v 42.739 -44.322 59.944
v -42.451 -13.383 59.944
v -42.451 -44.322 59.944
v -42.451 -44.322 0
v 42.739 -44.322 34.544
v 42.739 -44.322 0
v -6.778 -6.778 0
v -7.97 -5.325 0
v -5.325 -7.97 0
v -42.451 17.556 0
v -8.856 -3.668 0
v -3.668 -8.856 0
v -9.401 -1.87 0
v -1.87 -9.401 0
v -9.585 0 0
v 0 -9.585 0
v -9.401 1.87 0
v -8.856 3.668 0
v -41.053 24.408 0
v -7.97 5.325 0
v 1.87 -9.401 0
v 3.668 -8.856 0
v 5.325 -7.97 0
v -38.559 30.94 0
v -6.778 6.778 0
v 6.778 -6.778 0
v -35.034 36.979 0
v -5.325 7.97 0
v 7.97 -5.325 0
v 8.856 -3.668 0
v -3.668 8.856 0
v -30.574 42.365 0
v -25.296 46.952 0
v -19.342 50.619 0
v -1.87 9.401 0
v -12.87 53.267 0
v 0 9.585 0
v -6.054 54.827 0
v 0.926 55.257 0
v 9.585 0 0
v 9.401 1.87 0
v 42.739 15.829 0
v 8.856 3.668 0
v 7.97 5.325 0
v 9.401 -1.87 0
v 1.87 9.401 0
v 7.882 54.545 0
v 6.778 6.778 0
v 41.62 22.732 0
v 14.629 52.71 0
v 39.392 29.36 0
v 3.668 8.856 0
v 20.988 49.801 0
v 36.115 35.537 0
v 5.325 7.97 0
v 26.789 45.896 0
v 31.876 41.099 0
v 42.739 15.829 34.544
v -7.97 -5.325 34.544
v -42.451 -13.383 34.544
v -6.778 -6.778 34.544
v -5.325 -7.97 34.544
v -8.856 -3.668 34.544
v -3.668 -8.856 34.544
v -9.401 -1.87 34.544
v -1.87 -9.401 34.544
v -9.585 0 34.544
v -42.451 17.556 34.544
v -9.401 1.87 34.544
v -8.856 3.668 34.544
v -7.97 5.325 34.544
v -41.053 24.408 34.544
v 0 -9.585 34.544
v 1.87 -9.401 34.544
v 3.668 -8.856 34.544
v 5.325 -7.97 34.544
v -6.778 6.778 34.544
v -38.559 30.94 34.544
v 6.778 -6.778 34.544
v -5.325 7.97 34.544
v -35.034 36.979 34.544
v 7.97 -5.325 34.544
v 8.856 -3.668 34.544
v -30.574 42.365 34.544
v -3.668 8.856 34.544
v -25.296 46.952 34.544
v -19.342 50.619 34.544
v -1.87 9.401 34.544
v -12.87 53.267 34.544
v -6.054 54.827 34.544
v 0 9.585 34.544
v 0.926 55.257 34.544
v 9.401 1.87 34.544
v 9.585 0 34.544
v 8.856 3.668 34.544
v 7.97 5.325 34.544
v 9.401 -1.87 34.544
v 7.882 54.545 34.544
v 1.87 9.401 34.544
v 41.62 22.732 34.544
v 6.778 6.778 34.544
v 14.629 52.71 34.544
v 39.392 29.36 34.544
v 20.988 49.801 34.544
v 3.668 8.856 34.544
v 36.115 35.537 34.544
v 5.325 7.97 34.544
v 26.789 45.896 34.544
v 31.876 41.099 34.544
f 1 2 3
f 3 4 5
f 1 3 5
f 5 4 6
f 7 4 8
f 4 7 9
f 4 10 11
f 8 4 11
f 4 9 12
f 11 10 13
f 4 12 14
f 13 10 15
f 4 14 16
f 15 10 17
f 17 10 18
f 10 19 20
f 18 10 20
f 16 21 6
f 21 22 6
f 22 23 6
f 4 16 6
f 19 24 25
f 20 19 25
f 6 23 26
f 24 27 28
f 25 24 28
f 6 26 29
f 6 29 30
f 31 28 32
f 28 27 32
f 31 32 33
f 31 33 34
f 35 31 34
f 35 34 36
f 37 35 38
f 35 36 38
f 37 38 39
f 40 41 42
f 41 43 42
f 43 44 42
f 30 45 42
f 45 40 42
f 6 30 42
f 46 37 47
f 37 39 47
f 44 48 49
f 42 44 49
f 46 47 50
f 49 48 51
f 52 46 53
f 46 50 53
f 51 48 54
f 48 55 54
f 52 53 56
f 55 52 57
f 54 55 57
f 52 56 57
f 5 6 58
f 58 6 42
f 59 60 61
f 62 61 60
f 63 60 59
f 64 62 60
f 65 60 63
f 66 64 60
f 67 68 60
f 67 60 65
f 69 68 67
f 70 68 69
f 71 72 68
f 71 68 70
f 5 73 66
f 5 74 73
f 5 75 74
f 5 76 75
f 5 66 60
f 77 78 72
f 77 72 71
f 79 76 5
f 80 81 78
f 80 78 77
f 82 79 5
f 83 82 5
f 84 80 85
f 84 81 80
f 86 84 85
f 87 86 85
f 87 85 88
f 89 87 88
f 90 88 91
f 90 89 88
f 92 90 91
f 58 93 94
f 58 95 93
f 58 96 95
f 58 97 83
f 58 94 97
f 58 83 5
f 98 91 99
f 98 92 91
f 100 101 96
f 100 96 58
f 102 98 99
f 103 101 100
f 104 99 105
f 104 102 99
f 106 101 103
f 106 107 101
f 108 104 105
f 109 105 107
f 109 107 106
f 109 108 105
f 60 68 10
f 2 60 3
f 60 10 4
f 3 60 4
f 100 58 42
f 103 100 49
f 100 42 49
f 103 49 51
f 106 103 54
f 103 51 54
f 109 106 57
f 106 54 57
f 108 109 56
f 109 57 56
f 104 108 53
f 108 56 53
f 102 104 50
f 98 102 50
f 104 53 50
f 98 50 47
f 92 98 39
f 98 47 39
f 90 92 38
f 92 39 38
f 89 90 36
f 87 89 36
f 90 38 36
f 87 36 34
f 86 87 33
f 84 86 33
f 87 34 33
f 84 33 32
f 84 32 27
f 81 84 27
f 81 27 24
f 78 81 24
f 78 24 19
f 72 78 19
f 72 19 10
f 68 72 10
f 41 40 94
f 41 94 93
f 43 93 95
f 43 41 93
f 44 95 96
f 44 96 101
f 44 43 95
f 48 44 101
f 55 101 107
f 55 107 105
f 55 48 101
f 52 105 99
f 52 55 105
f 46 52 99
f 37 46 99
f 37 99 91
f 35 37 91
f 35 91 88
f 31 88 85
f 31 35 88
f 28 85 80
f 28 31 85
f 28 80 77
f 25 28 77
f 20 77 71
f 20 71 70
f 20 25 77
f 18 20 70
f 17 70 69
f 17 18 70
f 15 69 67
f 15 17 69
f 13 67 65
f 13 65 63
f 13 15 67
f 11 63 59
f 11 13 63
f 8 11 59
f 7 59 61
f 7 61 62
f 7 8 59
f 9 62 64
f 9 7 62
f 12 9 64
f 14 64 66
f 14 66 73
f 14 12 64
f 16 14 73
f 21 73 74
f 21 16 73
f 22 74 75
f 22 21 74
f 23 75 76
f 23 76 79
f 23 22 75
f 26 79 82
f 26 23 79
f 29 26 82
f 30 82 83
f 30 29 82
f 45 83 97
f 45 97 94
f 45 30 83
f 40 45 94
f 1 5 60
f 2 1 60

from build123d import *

# Parameters (mm, degrees)
F1_DEPTH = 59.944
F0_R     = 9.5854875755
F2_DEPTH = 34.544


with BuildPart() as f1:
    # F0 (on Top) → F1 (new body)
    with BuildSketch(Plane.XY):
        Polygon((42.7391566336, -44.3220846355), (-42.4513481557, -13.3829666302), (-42.4513481557, -44.3220846355), align=None)
    extrude(amount=F1_DEPTH)

    # F0 (on Top) → F2 (join)
    with BuildSketch(Plane.XY):
        with BuildLine():
            ThreePointArc((42.7391566336, 15.8293172717), (0.9256115544, 55.2569720027), (-42.4513481557, 17.5561513752))
            Line((-42.4513481557, 17.5561513752), (-42.4513481557, -13.3829666302))
            Line((-42.4513481557, -13.3829666302), (42.7391566336, -44.3220846355))
            Line((42.7391566336, -44.3220846355), (42.7391566336, 15.8293172717))
        make_face()
        Circle(F0_R, mode=Mode.SUBTRACT)
    extrude(amount=F2_DEPTH)


solid = f1.part
